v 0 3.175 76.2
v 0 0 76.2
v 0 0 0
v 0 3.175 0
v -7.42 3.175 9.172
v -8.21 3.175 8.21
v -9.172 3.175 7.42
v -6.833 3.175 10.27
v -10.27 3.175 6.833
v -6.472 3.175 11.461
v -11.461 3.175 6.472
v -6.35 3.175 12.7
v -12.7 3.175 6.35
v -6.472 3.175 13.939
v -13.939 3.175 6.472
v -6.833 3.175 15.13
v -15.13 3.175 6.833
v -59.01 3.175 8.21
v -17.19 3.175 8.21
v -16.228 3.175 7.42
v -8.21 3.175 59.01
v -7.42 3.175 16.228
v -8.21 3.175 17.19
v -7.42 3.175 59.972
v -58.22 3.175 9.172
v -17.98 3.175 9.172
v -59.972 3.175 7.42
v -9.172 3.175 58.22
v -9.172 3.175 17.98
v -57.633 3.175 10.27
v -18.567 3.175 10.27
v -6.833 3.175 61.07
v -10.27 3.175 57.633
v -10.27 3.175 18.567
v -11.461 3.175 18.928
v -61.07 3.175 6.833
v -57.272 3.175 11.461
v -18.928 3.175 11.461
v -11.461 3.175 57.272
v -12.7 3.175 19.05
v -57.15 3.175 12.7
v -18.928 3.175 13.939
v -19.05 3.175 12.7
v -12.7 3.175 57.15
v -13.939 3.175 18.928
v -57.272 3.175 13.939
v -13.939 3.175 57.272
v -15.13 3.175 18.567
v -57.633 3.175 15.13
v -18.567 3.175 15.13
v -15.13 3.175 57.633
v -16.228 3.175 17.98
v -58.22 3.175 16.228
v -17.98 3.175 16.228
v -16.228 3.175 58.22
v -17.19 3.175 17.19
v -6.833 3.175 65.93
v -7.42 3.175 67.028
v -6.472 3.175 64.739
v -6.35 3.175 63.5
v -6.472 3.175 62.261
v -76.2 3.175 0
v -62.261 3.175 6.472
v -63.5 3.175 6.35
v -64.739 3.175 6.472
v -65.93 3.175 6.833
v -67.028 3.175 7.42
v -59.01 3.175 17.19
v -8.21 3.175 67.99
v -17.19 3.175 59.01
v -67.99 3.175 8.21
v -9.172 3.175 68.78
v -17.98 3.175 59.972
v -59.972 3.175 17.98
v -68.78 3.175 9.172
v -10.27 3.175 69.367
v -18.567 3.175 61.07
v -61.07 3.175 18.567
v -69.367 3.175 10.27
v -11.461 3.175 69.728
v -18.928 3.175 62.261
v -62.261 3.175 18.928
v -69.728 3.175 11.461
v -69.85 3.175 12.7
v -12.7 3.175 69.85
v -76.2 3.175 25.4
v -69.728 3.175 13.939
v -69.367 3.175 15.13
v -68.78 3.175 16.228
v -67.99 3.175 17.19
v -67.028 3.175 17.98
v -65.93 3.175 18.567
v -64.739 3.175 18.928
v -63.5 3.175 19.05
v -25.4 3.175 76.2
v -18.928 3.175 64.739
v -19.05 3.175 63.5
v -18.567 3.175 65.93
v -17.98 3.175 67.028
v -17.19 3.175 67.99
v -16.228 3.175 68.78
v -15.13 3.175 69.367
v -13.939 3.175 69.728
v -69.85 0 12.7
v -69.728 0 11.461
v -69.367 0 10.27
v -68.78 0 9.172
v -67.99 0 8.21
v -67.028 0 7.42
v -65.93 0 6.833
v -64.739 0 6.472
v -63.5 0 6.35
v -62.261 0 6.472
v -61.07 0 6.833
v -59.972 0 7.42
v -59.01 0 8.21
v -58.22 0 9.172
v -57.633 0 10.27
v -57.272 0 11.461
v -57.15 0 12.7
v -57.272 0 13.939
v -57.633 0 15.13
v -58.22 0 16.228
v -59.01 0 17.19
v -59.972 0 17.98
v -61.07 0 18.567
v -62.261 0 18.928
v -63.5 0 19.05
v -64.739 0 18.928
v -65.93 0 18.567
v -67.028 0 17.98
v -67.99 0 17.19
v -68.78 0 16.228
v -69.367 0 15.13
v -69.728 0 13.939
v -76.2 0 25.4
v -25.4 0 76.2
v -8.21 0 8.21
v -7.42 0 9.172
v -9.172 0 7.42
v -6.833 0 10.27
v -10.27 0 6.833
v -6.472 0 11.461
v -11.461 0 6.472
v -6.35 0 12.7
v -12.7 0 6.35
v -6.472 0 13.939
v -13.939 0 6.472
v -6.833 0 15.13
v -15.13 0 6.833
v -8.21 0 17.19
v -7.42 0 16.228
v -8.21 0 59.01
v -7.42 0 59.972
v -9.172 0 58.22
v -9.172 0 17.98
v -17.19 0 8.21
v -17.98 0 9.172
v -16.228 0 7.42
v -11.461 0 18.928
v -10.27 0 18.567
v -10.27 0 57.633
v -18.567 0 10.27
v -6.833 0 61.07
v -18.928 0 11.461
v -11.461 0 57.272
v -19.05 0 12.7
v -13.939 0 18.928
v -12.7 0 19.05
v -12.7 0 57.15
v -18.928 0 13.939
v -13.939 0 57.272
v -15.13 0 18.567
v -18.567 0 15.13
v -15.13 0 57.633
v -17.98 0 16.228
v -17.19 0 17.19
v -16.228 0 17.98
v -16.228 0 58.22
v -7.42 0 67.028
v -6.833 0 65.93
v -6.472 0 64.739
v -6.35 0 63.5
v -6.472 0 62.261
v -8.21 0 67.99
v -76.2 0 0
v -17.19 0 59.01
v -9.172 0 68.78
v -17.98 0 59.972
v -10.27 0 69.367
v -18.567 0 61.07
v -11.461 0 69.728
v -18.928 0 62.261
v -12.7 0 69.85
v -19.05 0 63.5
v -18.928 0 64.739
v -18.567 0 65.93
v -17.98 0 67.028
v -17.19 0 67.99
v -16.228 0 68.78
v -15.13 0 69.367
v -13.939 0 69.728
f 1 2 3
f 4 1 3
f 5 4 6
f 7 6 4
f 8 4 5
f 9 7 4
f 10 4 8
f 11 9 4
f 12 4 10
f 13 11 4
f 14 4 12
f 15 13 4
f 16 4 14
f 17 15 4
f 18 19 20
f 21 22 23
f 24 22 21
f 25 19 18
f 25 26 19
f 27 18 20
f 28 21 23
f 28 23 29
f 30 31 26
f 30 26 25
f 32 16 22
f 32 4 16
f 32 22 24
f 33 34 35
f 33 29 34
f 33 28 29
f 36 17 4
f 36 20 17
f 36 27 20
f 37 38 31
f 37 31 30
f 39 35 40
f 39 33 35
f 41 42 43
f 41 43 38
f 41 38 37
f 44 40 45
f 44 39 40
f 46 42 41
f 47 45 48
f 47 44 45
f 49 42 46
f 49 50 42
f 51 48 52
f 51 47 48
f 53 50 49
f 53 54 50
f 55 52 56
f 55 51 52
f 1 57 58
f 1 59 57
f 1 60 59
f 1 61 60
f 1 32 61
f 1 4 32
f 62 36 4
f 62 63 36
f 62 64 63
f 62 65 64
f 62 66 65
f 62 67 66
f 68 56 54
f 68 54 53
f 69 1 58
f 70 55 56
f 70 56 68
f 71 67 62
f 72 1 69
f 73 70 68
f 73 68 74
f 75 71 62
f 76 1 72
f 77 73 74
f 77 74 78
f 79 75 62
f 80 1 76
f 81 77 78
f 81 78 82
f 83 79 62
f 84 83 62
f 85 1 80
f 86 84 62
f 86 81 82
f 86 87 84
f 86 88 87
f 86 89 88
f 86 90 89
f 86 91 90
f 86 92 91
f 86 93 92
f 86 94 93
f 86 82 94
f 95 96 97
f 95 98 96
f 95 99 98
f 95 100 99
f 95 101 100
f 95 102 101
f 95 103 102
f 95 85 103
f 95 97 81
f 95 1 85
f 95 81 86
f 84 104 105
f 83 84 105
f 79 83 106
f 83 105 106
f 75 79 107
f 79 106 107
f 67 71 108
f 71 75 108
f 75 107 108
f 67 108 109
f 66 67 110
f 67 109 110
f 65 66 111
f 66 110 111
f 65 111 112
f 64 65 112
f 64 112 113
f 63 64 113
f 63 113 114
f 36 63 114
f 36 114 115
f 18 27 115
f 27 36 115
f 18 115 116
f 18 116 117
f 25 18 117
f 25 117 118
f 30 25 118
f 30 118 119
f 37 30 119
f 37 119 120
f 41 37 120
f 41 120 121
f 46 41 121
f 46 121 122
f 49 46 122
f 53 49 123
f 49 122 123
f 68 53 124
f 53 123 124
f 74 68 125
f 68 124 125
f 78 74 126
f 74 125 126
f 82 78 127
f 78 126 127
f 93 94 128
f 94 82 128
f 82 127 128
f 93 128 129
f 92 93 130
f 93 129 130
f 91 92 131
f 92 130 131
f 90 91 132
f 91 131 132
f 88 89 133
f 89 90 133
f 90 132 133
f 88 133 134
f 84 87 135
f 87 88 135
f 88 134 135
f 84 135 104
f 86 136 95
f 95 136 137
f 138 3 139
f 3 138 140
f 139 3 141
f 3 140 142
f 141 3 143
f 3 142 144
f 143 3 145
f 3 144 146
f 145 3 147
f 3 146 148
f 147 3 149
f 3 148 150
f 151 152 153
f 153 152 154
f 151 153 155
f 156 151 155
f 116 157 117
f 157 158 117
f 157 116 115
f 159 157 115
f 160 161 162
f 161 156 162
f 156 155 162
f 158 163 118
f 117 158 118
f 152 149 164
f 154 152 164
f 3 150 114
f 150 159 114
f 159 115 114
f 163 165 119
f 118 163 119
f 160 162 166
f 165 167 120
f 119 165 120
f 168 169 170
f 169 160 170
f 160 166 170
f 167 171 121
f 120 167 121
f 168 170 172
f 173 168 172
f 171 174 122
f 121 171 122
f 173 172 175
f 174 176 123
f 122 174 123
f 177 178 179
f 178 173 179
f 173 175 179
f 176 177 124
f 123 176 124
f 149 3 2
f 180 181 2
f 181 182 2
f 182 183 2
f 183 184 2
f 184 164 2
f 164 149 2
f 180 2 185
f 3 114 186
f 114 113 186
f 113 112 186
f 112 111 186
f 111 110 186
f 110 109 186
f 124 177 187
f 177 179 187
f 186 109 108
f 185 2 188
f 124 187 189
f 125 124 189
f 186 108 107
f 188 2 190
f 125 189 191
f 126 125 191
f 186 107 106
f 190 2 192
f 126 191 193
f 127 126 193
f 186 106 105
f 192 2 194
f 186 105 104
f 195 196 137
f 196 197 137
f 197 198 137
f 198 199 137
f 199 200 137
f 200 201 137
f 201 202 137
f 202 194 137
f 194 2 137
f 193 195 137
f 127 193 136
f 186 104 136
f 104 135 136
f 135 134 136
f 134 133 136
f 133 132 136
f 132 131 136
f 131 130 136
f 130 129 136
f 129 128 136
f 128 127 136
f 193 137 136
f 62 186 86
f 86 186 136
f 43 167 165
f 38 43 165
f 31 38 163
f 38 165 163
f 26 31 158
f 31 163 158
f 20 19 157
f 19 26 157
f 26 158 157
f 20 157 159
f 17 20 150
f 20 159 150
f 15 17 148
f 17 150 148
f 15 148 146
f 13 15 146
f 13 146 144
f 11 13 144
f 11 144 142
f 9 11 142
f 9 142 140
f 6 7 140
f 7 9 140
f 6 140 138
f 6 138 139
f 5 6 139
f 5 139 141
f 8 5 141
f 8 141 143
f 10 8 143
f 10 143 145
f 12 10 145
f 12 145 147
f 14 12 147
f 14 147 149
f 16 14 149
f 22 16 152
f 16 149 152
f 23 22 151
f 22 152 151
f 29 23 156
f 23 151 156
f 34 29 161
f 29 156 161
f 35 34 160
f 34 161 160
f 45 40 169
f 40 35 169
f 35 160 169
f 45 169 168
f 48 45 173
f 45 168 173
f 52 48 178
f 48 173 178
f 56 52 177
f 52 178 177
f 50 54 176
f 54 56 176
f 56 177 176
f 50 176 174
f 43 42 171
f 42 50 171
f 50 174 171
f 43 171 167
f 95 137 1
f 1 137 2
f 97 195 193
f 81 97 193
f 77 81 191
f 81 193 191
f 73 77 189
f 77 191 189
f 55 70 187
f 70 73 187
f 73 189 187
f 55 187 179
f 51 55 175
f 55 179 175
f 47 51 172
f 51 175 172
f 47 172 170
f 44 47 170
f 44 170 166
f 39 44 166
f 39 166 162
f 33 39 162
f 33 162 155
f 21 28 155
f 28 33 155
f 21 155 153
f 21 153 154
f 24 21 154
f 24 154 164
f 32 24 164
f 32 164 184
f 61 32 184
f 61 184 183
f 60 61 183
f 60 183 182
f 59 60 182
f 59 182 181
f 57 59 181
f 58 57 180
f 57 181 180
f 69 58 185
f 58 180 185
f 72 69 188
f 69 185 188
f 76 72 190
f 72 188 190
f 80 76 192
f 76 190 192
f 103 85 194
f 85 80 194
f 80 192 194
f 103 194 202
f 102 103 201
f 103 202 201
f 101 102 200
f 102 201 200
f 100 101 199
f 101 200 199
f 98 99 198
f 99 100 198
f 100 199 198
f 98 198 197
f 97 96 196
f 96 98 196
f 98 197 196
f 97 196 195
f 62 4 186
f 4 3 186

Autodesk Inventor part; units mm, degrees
ref_plane "YZ Plane" through (0, 0, 0) normal (1, 0, 0) x (0, 1, 0)
ref_plane "XZ Plane" through (0, 0, 0) normal (0, 1, 0) x (-1, 0, 0)
ref_plane "XY Plane" through (0, 0, 0) normal (0, 0, 1) x (1, 0, 0)
sketch "Sketch1" plane through (0, 0, 0) normal (0, 1, 0) x (-1, 0, 0)
  line L0 (0, 0) -> (76.2, 0)
  line L1 (76.2, 0) -> (76.2, 25.4)
  line L2 (25.4, 76.2) -> (0, 76.2)
  line L3 (0, 76.2) -> (0, 0)
  line L4 (76.2, 25.4) -> (25.4, 76.2)
  circle A0 centre (63.5, 12.7) radius 6.35
  circle A1 centre (12.7, 63.5) radius 6.35
  circle A2 centre (12.7, 12.7) radius 6.35
  point P0 (76.2, 76.2)
  dimension "d0" = 76.2
  dimension "d1" = 76.2
  dimension "d2" = 50.8
  dimension "d3" = 50.8
  dimension "d4" = 12.7
  dimension "d5" = 12.7
  dimension "d6" = 12.7
  dimension "d7" = 12.7
  dimension "d8" = 50.8
  dimension "d9" = 50.8
  dimension "d10" = 12.7
  dimension "d11" = 12.7
  dimension "d12" = 12.7
extrude "Extrusion1" add sketch "Sketch1" along normal blind 3.175
equation "\"d0\" = d1"
equation "\"d3\" = d2"
properties part number "3 inch gusset plate"
